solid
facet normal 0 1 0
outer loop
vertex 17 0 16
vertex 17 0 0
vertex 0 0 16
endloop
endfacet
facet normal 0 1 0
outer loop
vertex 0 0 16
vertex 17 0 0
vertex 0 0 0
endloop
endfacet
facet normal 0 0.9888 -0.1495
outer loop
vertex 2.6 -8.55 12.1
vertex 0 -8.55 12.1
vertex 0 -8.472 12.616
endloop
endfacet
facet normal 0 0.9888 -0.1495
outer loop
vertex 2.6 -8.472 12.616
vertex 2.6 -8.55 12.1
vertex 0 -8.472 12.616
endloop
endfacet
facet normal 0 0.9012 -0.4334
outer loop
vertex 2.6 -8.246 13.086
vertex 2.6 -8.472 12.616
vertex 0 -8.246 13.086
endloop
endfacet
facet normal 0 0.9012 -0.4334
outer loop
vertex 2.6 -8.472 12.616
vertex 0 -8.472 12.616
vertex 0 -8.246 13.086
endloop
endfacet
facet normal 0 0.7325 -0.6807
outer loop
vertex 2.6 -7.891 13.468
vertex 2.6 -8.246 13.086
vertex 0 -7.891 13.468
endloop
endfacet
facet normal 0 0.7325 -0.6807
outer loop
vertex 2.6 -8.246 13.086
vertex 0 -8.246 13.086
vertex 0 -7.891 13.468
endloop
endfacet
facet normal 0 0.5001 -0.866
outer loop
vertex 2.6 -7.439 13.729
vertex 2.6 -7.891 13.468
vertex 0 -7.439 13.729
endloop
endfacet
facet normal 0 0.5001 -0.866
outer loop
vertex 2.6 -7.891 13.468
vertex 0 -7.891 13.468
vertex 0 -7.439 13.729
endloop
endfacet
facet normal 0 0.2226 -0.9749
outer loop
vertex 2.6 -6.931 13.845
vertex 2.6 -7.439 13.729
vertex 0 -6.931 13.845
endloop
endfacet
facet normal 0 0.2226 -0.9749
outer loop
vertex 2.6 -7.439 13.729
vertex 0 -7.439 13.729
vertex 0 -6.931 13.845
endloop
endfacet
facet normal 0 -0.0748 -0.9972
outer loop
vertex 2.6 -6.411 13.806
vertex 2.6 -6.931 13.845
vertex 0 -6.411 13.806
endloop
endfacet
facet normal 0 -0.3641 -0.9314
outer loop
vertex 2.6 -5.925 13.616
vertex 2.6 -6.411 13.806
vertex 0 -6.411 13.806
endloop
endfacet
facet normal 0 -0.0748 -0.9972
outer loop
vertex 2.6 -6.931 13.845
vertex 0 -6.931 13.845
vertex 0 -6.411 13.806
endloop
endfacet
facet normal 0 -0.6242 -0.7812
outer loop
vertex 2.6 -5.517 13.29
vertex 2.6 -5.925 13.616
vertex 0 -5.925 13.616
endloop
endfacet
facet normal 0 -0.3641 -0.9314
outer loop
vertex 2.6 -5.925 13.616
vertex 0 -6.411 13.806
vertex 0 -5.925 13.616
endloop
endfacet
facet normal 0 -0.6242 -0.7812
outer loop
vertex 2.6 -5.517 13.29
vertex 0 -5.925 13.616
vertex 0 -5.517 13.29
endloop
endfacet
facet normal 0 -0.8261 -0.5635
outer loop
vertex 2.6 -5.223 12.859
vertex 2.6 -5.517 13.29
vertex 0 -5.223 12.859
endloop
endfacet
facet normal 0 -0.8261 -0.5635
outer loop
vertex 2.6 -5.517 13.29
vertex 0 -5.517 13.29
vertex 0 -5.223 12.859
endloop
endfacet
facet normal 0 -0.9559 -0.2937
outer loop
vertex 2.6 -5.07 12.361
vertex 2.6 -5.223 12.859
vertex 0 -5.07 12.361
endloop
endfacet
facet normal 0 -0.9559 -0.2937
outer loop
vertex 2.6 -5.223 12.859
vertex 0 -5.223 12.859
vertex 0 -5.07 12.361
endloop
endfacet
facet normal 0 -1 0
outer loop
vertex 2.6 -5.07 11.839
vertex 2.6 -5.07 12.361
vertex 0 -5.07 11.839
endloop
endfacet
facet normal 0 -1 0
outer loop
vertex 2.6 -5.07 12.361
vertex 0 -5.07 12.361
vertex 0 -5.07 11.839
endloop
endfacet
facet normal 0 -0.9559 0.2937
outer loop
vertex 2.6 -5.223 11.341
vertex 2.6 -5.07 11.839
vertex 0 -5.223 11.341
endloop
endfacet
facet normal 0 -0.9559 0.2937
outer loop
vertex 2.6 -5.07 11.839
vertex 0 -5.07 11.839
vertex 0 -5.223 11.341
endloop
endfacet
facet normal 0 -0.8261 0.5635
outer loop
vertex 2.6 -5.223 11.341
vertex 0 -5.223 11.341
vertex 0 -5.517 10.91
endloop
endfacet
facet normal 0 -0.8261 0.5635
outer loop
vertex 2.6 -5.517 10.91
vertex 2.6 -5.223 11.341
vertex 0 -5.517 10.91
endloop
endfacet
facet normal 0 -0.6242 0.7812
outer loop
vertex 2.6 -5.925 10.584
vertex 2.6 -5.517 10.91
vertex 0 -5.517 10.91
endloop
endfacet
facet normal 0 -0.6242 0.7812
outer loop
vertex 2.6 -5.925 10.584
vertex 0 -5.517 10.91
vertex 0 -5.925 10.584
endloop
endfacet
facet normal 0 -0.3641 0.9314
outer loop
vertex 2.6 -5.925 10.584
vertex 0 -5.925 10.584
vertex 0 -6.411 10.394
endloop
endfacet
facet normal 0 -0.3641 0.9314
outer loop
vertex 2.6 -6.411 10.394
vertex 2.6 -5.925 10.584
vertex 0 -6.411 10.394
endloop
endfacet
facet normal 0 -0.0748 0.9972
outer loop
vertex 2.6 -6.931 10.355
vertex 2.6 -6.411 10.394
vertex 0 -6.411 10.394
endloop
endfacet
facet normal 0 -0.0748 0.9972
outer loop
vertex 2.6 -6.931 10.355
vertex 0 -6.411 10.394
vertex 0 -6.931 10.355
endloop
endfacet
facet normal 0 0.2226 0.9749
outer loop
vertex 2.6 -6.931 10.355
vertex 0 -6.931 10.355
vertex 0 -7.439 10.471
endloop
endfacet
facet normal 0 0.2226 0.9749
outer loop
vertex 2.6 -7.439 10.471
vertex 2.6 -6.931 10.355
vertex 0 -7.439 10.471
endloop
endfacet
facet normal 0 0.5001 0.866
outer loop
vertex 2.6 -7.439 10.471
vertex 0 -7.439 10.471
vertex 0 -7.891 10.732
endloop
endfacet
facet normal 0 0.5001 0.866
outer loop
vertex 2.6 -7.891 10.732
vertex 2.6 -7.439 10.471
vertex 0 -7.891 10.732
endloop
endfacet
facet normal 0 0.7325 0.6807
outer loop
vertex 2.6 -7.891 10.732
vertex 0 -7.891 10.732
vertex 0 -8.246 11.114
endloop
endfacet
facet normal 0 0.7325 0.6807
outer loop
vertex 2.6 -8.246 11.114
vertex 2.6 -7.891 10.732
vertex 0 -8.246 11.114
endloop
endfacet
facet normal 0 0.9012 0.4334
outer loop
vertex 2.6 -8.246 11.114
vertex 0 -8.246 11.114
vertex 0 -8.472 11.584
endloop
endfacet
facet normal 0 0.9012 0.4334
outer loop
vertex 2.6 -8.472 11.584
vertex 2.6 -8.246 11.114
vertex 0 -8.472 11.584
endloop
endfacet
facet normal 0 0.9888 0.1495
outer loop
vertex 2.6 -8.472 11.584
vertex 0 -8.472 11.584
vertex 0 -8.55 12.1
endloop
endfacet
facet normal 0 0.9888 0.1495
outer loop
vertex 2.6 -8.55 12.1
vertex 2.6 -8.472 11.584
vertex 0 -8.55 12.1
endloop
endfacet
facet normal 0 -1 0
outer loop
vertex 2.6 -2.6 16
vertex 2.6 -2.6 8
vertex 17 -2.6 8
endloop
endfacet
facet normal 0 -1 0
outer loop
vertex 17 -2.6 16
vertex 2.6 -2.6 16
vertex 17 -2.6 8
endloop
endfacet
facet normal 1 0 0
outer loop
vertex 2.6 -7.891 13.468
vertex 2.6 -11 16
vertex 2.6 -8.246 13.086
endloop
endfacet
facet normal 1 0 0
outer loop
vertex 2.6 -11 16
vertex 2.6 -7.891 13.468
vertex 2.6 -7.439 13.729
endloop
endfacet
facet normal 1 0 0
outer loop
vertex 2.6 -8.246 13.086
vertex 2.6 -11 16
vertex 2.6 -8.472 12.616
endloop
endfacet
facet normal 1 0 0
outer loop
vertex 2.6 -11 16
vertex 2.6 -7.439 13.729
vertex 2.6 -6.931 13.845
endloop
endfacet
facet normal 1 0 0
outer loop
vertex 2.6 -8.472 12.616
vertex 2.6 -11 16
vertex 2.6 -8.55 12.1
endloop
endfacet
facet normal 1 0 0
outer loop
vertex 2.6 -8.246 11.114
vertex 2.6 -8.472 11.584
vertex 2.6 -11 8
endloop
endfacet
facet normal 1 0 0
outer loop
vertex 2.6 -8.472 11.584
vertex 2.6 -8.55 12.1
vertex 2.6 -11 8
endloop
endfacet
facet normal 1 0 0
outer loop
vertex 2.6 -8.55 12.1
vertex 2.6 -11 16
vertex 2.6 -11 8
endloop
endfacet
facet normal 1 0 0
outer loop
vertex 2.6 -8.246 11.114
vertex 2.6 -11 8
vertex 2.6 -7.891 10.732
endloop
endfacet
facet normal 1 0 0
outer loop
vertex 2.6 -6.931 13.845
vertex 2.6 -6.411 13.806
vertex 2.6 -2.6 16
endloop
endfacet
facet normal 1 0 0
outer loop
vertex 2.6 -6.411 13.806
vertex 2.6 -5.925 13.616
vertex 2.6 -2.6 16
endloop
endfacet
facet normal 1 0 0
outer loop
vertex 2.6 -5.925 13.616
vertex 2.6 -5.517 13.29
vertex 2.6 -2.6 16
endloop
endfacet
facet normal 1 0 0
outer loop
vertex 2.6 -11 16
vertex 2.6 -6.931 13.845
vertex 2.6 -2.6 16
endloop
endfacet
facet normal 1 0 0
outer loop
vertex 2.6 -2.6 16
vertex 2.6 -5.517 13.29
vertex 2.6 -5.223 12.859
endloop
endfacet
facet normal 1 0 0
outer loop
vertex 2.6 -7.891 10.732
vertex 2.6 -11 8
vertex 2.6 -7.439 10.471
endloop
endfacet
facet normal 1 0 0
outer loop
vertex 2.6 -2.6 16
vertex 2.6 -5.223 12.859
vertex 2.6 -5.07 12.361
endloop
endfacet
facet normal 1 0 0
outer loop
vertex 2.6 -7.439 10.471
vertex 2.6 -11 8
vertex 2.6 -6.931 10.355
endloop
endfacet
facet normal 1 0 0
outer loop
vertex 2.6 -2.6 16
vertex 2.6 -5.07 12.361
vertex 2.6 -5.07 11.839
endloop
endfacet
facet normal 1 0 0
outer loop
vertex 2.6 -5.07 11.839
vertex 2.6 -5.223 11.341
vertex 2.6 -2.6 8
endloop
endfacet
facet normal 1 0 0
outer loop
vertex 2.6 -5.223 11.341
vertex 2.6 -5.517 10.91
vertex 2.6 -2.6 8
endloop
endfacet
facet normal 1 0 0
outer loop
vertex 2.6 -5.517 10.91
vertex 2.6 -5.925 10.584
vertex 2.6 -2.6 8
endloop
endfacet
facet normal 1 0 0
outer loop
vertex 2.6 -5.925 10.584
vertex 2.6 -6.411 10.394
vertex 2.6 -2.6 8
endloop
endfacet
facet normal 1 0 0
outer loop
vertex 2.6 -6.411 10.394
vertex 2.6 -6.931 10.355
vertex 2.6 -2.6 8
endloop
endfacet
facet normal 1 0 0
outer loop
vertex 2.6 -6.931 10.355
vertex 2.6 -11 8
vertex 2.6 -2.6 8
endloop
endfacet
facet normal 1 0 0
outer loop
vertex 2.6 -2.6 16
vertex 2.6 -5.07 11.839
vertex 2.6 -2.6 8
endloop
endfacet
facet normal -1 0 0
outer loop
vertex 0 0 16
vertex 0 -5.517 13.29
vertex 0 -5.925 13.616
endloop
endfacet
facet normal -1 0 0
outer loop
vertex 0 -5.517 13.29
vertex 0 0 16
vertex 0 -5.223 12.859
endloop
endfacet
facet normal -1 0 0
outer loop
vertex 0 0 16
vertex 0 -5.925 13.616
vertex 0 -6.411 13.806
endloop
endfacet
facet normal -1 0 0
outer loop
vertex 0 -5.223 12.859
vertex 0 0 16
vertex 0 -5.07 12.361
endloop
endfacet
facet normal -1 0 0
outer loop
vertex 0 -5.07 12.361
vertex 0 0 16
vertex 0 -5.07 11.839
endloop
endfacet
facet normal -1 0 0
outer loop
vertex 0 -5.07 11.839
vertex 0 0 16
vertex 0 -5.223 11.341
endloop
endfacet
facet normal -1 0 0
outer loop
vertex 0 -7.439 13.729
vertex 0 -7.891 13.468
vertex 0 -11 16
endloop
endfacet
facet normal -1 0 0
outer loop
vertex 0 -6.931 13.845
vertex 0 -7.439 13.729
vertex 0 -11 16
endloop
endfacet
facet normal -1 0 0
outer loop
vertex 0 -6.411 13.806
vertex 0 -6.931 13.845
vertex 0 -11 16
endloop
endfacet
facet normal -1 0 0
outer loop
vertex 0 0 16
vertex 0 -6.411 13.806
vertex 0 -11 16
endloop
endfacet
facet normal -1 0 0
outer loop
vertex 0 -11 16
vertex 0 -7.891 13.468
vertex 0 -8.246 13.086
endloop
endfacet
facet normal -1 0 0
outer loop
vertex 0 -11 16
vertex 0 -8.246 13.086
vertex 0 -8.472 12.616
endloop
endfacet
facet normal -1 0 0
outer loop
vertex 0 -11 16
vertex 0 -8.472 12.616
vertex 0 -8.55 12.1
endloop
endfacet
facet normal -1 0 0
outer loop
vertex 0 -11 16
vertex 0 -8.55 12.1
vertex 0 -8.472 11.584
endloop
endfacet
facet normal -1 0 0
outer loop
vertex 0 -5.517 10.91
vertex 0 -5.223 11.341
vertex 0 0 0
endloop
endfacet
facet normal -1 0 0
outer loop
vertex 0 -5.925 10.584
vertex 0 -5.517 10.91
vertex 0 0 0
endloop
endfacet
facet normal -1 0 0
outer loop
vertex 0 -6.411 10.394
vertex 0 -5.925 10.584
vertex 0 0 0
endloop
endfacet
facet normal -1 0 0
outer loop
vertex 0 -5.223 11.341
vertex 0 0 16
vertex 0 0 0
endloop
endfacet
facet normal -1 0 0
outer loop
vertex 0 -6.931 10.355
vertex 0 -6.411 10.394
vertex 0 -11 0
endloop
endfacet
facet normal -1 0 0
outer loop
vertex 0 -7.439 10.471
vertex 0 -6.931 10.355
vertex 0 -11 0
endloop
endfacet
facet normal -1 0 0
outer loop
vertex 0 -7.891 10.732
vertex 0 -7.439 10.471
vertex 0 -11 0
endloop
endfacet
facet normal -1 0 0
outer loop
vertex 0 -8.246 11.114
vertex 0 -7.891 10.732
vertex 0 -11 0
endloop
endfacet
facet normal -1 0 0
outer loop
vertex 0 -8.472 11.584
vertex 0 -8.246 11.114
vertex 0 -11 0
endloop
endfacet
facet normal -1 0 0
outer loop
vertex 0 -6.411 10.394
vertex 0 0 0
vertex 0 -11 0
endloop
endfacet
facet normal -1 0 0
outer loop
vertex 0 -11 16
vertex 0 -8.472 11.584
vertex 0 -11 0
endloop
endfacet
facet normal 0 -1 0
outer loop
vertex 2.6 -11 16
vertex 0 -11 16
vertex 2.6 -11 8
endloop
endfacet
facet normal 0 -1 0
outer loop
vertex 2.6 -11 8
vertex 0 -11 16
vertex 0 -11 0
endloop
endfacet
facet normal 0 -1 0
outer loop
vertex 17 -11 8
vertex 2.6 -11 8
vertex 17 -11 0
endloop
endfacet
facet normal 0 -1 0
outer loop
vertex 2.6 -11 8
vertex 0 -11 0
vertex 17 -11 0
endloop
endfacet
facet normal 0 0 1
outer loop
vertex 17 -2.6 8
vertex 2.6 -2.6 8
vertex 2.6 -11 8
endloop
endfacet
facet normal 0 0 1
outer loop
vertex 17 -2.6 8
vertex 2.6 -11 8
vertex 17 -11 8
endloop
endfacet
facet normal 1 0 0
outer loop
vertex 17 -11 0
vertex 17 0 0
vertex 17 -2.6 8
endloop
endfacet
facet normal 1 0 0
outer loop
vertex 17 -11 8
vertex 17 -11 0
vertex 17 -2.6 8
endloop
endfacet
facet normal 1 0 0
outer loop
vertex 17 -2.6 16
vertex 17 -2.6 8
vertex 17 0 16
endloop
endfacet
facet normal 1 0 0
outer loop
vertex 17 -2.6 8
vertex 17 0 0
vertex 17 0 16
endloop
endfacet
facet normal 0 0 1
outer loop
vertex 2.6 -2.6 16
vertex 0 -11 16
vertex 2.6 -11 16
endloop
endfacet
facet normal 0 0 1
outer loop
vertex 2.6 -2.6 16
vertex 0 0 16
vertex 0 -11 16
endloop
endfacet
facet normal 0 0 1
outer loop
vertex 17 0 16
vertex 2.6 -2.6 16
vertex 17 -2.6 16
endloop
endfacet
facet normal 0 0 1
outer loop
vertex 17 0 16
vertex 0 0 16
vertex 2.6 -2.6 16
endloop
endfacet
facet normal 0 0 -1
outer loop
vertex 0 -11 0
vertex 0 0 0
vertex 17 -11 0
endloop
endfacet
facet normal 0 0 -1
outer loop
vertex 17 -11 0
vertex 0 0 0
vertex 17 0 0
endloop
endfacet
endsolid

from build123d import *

# Parameters (mm, degrees)
F0_W     = 17
F0_H     = 8
F1_DEPTH = 11
F3_DEPTH = 8
F5_D     = 3.5


with BuildPart() as f1:
    # F0 (on Front) → F1 (new body)
    with BuildSketch(Plane.XZ):
        with Locations((8.5, 4)):
            Rectangle(F0_W, F0_H)
    extrude(amount=F1_DEPTH)

    # F2 (on face) → F3 (join)
    with BuildSketch(Plane.XY.offset(8)):
        Polygon((0, -11), (2.6, -11), (2.6, -2.6), (17, -2.6), (17, 0), (0, 0), align=None)
    extrude(amount=F3_DEPTH)

    # F5 (through all)
    with Locations(Plane.YZ.offset(2.6)):
        with Locations((-6.8, 12.1)):
            Hole(F5_D / 2)


solid = f1.part
